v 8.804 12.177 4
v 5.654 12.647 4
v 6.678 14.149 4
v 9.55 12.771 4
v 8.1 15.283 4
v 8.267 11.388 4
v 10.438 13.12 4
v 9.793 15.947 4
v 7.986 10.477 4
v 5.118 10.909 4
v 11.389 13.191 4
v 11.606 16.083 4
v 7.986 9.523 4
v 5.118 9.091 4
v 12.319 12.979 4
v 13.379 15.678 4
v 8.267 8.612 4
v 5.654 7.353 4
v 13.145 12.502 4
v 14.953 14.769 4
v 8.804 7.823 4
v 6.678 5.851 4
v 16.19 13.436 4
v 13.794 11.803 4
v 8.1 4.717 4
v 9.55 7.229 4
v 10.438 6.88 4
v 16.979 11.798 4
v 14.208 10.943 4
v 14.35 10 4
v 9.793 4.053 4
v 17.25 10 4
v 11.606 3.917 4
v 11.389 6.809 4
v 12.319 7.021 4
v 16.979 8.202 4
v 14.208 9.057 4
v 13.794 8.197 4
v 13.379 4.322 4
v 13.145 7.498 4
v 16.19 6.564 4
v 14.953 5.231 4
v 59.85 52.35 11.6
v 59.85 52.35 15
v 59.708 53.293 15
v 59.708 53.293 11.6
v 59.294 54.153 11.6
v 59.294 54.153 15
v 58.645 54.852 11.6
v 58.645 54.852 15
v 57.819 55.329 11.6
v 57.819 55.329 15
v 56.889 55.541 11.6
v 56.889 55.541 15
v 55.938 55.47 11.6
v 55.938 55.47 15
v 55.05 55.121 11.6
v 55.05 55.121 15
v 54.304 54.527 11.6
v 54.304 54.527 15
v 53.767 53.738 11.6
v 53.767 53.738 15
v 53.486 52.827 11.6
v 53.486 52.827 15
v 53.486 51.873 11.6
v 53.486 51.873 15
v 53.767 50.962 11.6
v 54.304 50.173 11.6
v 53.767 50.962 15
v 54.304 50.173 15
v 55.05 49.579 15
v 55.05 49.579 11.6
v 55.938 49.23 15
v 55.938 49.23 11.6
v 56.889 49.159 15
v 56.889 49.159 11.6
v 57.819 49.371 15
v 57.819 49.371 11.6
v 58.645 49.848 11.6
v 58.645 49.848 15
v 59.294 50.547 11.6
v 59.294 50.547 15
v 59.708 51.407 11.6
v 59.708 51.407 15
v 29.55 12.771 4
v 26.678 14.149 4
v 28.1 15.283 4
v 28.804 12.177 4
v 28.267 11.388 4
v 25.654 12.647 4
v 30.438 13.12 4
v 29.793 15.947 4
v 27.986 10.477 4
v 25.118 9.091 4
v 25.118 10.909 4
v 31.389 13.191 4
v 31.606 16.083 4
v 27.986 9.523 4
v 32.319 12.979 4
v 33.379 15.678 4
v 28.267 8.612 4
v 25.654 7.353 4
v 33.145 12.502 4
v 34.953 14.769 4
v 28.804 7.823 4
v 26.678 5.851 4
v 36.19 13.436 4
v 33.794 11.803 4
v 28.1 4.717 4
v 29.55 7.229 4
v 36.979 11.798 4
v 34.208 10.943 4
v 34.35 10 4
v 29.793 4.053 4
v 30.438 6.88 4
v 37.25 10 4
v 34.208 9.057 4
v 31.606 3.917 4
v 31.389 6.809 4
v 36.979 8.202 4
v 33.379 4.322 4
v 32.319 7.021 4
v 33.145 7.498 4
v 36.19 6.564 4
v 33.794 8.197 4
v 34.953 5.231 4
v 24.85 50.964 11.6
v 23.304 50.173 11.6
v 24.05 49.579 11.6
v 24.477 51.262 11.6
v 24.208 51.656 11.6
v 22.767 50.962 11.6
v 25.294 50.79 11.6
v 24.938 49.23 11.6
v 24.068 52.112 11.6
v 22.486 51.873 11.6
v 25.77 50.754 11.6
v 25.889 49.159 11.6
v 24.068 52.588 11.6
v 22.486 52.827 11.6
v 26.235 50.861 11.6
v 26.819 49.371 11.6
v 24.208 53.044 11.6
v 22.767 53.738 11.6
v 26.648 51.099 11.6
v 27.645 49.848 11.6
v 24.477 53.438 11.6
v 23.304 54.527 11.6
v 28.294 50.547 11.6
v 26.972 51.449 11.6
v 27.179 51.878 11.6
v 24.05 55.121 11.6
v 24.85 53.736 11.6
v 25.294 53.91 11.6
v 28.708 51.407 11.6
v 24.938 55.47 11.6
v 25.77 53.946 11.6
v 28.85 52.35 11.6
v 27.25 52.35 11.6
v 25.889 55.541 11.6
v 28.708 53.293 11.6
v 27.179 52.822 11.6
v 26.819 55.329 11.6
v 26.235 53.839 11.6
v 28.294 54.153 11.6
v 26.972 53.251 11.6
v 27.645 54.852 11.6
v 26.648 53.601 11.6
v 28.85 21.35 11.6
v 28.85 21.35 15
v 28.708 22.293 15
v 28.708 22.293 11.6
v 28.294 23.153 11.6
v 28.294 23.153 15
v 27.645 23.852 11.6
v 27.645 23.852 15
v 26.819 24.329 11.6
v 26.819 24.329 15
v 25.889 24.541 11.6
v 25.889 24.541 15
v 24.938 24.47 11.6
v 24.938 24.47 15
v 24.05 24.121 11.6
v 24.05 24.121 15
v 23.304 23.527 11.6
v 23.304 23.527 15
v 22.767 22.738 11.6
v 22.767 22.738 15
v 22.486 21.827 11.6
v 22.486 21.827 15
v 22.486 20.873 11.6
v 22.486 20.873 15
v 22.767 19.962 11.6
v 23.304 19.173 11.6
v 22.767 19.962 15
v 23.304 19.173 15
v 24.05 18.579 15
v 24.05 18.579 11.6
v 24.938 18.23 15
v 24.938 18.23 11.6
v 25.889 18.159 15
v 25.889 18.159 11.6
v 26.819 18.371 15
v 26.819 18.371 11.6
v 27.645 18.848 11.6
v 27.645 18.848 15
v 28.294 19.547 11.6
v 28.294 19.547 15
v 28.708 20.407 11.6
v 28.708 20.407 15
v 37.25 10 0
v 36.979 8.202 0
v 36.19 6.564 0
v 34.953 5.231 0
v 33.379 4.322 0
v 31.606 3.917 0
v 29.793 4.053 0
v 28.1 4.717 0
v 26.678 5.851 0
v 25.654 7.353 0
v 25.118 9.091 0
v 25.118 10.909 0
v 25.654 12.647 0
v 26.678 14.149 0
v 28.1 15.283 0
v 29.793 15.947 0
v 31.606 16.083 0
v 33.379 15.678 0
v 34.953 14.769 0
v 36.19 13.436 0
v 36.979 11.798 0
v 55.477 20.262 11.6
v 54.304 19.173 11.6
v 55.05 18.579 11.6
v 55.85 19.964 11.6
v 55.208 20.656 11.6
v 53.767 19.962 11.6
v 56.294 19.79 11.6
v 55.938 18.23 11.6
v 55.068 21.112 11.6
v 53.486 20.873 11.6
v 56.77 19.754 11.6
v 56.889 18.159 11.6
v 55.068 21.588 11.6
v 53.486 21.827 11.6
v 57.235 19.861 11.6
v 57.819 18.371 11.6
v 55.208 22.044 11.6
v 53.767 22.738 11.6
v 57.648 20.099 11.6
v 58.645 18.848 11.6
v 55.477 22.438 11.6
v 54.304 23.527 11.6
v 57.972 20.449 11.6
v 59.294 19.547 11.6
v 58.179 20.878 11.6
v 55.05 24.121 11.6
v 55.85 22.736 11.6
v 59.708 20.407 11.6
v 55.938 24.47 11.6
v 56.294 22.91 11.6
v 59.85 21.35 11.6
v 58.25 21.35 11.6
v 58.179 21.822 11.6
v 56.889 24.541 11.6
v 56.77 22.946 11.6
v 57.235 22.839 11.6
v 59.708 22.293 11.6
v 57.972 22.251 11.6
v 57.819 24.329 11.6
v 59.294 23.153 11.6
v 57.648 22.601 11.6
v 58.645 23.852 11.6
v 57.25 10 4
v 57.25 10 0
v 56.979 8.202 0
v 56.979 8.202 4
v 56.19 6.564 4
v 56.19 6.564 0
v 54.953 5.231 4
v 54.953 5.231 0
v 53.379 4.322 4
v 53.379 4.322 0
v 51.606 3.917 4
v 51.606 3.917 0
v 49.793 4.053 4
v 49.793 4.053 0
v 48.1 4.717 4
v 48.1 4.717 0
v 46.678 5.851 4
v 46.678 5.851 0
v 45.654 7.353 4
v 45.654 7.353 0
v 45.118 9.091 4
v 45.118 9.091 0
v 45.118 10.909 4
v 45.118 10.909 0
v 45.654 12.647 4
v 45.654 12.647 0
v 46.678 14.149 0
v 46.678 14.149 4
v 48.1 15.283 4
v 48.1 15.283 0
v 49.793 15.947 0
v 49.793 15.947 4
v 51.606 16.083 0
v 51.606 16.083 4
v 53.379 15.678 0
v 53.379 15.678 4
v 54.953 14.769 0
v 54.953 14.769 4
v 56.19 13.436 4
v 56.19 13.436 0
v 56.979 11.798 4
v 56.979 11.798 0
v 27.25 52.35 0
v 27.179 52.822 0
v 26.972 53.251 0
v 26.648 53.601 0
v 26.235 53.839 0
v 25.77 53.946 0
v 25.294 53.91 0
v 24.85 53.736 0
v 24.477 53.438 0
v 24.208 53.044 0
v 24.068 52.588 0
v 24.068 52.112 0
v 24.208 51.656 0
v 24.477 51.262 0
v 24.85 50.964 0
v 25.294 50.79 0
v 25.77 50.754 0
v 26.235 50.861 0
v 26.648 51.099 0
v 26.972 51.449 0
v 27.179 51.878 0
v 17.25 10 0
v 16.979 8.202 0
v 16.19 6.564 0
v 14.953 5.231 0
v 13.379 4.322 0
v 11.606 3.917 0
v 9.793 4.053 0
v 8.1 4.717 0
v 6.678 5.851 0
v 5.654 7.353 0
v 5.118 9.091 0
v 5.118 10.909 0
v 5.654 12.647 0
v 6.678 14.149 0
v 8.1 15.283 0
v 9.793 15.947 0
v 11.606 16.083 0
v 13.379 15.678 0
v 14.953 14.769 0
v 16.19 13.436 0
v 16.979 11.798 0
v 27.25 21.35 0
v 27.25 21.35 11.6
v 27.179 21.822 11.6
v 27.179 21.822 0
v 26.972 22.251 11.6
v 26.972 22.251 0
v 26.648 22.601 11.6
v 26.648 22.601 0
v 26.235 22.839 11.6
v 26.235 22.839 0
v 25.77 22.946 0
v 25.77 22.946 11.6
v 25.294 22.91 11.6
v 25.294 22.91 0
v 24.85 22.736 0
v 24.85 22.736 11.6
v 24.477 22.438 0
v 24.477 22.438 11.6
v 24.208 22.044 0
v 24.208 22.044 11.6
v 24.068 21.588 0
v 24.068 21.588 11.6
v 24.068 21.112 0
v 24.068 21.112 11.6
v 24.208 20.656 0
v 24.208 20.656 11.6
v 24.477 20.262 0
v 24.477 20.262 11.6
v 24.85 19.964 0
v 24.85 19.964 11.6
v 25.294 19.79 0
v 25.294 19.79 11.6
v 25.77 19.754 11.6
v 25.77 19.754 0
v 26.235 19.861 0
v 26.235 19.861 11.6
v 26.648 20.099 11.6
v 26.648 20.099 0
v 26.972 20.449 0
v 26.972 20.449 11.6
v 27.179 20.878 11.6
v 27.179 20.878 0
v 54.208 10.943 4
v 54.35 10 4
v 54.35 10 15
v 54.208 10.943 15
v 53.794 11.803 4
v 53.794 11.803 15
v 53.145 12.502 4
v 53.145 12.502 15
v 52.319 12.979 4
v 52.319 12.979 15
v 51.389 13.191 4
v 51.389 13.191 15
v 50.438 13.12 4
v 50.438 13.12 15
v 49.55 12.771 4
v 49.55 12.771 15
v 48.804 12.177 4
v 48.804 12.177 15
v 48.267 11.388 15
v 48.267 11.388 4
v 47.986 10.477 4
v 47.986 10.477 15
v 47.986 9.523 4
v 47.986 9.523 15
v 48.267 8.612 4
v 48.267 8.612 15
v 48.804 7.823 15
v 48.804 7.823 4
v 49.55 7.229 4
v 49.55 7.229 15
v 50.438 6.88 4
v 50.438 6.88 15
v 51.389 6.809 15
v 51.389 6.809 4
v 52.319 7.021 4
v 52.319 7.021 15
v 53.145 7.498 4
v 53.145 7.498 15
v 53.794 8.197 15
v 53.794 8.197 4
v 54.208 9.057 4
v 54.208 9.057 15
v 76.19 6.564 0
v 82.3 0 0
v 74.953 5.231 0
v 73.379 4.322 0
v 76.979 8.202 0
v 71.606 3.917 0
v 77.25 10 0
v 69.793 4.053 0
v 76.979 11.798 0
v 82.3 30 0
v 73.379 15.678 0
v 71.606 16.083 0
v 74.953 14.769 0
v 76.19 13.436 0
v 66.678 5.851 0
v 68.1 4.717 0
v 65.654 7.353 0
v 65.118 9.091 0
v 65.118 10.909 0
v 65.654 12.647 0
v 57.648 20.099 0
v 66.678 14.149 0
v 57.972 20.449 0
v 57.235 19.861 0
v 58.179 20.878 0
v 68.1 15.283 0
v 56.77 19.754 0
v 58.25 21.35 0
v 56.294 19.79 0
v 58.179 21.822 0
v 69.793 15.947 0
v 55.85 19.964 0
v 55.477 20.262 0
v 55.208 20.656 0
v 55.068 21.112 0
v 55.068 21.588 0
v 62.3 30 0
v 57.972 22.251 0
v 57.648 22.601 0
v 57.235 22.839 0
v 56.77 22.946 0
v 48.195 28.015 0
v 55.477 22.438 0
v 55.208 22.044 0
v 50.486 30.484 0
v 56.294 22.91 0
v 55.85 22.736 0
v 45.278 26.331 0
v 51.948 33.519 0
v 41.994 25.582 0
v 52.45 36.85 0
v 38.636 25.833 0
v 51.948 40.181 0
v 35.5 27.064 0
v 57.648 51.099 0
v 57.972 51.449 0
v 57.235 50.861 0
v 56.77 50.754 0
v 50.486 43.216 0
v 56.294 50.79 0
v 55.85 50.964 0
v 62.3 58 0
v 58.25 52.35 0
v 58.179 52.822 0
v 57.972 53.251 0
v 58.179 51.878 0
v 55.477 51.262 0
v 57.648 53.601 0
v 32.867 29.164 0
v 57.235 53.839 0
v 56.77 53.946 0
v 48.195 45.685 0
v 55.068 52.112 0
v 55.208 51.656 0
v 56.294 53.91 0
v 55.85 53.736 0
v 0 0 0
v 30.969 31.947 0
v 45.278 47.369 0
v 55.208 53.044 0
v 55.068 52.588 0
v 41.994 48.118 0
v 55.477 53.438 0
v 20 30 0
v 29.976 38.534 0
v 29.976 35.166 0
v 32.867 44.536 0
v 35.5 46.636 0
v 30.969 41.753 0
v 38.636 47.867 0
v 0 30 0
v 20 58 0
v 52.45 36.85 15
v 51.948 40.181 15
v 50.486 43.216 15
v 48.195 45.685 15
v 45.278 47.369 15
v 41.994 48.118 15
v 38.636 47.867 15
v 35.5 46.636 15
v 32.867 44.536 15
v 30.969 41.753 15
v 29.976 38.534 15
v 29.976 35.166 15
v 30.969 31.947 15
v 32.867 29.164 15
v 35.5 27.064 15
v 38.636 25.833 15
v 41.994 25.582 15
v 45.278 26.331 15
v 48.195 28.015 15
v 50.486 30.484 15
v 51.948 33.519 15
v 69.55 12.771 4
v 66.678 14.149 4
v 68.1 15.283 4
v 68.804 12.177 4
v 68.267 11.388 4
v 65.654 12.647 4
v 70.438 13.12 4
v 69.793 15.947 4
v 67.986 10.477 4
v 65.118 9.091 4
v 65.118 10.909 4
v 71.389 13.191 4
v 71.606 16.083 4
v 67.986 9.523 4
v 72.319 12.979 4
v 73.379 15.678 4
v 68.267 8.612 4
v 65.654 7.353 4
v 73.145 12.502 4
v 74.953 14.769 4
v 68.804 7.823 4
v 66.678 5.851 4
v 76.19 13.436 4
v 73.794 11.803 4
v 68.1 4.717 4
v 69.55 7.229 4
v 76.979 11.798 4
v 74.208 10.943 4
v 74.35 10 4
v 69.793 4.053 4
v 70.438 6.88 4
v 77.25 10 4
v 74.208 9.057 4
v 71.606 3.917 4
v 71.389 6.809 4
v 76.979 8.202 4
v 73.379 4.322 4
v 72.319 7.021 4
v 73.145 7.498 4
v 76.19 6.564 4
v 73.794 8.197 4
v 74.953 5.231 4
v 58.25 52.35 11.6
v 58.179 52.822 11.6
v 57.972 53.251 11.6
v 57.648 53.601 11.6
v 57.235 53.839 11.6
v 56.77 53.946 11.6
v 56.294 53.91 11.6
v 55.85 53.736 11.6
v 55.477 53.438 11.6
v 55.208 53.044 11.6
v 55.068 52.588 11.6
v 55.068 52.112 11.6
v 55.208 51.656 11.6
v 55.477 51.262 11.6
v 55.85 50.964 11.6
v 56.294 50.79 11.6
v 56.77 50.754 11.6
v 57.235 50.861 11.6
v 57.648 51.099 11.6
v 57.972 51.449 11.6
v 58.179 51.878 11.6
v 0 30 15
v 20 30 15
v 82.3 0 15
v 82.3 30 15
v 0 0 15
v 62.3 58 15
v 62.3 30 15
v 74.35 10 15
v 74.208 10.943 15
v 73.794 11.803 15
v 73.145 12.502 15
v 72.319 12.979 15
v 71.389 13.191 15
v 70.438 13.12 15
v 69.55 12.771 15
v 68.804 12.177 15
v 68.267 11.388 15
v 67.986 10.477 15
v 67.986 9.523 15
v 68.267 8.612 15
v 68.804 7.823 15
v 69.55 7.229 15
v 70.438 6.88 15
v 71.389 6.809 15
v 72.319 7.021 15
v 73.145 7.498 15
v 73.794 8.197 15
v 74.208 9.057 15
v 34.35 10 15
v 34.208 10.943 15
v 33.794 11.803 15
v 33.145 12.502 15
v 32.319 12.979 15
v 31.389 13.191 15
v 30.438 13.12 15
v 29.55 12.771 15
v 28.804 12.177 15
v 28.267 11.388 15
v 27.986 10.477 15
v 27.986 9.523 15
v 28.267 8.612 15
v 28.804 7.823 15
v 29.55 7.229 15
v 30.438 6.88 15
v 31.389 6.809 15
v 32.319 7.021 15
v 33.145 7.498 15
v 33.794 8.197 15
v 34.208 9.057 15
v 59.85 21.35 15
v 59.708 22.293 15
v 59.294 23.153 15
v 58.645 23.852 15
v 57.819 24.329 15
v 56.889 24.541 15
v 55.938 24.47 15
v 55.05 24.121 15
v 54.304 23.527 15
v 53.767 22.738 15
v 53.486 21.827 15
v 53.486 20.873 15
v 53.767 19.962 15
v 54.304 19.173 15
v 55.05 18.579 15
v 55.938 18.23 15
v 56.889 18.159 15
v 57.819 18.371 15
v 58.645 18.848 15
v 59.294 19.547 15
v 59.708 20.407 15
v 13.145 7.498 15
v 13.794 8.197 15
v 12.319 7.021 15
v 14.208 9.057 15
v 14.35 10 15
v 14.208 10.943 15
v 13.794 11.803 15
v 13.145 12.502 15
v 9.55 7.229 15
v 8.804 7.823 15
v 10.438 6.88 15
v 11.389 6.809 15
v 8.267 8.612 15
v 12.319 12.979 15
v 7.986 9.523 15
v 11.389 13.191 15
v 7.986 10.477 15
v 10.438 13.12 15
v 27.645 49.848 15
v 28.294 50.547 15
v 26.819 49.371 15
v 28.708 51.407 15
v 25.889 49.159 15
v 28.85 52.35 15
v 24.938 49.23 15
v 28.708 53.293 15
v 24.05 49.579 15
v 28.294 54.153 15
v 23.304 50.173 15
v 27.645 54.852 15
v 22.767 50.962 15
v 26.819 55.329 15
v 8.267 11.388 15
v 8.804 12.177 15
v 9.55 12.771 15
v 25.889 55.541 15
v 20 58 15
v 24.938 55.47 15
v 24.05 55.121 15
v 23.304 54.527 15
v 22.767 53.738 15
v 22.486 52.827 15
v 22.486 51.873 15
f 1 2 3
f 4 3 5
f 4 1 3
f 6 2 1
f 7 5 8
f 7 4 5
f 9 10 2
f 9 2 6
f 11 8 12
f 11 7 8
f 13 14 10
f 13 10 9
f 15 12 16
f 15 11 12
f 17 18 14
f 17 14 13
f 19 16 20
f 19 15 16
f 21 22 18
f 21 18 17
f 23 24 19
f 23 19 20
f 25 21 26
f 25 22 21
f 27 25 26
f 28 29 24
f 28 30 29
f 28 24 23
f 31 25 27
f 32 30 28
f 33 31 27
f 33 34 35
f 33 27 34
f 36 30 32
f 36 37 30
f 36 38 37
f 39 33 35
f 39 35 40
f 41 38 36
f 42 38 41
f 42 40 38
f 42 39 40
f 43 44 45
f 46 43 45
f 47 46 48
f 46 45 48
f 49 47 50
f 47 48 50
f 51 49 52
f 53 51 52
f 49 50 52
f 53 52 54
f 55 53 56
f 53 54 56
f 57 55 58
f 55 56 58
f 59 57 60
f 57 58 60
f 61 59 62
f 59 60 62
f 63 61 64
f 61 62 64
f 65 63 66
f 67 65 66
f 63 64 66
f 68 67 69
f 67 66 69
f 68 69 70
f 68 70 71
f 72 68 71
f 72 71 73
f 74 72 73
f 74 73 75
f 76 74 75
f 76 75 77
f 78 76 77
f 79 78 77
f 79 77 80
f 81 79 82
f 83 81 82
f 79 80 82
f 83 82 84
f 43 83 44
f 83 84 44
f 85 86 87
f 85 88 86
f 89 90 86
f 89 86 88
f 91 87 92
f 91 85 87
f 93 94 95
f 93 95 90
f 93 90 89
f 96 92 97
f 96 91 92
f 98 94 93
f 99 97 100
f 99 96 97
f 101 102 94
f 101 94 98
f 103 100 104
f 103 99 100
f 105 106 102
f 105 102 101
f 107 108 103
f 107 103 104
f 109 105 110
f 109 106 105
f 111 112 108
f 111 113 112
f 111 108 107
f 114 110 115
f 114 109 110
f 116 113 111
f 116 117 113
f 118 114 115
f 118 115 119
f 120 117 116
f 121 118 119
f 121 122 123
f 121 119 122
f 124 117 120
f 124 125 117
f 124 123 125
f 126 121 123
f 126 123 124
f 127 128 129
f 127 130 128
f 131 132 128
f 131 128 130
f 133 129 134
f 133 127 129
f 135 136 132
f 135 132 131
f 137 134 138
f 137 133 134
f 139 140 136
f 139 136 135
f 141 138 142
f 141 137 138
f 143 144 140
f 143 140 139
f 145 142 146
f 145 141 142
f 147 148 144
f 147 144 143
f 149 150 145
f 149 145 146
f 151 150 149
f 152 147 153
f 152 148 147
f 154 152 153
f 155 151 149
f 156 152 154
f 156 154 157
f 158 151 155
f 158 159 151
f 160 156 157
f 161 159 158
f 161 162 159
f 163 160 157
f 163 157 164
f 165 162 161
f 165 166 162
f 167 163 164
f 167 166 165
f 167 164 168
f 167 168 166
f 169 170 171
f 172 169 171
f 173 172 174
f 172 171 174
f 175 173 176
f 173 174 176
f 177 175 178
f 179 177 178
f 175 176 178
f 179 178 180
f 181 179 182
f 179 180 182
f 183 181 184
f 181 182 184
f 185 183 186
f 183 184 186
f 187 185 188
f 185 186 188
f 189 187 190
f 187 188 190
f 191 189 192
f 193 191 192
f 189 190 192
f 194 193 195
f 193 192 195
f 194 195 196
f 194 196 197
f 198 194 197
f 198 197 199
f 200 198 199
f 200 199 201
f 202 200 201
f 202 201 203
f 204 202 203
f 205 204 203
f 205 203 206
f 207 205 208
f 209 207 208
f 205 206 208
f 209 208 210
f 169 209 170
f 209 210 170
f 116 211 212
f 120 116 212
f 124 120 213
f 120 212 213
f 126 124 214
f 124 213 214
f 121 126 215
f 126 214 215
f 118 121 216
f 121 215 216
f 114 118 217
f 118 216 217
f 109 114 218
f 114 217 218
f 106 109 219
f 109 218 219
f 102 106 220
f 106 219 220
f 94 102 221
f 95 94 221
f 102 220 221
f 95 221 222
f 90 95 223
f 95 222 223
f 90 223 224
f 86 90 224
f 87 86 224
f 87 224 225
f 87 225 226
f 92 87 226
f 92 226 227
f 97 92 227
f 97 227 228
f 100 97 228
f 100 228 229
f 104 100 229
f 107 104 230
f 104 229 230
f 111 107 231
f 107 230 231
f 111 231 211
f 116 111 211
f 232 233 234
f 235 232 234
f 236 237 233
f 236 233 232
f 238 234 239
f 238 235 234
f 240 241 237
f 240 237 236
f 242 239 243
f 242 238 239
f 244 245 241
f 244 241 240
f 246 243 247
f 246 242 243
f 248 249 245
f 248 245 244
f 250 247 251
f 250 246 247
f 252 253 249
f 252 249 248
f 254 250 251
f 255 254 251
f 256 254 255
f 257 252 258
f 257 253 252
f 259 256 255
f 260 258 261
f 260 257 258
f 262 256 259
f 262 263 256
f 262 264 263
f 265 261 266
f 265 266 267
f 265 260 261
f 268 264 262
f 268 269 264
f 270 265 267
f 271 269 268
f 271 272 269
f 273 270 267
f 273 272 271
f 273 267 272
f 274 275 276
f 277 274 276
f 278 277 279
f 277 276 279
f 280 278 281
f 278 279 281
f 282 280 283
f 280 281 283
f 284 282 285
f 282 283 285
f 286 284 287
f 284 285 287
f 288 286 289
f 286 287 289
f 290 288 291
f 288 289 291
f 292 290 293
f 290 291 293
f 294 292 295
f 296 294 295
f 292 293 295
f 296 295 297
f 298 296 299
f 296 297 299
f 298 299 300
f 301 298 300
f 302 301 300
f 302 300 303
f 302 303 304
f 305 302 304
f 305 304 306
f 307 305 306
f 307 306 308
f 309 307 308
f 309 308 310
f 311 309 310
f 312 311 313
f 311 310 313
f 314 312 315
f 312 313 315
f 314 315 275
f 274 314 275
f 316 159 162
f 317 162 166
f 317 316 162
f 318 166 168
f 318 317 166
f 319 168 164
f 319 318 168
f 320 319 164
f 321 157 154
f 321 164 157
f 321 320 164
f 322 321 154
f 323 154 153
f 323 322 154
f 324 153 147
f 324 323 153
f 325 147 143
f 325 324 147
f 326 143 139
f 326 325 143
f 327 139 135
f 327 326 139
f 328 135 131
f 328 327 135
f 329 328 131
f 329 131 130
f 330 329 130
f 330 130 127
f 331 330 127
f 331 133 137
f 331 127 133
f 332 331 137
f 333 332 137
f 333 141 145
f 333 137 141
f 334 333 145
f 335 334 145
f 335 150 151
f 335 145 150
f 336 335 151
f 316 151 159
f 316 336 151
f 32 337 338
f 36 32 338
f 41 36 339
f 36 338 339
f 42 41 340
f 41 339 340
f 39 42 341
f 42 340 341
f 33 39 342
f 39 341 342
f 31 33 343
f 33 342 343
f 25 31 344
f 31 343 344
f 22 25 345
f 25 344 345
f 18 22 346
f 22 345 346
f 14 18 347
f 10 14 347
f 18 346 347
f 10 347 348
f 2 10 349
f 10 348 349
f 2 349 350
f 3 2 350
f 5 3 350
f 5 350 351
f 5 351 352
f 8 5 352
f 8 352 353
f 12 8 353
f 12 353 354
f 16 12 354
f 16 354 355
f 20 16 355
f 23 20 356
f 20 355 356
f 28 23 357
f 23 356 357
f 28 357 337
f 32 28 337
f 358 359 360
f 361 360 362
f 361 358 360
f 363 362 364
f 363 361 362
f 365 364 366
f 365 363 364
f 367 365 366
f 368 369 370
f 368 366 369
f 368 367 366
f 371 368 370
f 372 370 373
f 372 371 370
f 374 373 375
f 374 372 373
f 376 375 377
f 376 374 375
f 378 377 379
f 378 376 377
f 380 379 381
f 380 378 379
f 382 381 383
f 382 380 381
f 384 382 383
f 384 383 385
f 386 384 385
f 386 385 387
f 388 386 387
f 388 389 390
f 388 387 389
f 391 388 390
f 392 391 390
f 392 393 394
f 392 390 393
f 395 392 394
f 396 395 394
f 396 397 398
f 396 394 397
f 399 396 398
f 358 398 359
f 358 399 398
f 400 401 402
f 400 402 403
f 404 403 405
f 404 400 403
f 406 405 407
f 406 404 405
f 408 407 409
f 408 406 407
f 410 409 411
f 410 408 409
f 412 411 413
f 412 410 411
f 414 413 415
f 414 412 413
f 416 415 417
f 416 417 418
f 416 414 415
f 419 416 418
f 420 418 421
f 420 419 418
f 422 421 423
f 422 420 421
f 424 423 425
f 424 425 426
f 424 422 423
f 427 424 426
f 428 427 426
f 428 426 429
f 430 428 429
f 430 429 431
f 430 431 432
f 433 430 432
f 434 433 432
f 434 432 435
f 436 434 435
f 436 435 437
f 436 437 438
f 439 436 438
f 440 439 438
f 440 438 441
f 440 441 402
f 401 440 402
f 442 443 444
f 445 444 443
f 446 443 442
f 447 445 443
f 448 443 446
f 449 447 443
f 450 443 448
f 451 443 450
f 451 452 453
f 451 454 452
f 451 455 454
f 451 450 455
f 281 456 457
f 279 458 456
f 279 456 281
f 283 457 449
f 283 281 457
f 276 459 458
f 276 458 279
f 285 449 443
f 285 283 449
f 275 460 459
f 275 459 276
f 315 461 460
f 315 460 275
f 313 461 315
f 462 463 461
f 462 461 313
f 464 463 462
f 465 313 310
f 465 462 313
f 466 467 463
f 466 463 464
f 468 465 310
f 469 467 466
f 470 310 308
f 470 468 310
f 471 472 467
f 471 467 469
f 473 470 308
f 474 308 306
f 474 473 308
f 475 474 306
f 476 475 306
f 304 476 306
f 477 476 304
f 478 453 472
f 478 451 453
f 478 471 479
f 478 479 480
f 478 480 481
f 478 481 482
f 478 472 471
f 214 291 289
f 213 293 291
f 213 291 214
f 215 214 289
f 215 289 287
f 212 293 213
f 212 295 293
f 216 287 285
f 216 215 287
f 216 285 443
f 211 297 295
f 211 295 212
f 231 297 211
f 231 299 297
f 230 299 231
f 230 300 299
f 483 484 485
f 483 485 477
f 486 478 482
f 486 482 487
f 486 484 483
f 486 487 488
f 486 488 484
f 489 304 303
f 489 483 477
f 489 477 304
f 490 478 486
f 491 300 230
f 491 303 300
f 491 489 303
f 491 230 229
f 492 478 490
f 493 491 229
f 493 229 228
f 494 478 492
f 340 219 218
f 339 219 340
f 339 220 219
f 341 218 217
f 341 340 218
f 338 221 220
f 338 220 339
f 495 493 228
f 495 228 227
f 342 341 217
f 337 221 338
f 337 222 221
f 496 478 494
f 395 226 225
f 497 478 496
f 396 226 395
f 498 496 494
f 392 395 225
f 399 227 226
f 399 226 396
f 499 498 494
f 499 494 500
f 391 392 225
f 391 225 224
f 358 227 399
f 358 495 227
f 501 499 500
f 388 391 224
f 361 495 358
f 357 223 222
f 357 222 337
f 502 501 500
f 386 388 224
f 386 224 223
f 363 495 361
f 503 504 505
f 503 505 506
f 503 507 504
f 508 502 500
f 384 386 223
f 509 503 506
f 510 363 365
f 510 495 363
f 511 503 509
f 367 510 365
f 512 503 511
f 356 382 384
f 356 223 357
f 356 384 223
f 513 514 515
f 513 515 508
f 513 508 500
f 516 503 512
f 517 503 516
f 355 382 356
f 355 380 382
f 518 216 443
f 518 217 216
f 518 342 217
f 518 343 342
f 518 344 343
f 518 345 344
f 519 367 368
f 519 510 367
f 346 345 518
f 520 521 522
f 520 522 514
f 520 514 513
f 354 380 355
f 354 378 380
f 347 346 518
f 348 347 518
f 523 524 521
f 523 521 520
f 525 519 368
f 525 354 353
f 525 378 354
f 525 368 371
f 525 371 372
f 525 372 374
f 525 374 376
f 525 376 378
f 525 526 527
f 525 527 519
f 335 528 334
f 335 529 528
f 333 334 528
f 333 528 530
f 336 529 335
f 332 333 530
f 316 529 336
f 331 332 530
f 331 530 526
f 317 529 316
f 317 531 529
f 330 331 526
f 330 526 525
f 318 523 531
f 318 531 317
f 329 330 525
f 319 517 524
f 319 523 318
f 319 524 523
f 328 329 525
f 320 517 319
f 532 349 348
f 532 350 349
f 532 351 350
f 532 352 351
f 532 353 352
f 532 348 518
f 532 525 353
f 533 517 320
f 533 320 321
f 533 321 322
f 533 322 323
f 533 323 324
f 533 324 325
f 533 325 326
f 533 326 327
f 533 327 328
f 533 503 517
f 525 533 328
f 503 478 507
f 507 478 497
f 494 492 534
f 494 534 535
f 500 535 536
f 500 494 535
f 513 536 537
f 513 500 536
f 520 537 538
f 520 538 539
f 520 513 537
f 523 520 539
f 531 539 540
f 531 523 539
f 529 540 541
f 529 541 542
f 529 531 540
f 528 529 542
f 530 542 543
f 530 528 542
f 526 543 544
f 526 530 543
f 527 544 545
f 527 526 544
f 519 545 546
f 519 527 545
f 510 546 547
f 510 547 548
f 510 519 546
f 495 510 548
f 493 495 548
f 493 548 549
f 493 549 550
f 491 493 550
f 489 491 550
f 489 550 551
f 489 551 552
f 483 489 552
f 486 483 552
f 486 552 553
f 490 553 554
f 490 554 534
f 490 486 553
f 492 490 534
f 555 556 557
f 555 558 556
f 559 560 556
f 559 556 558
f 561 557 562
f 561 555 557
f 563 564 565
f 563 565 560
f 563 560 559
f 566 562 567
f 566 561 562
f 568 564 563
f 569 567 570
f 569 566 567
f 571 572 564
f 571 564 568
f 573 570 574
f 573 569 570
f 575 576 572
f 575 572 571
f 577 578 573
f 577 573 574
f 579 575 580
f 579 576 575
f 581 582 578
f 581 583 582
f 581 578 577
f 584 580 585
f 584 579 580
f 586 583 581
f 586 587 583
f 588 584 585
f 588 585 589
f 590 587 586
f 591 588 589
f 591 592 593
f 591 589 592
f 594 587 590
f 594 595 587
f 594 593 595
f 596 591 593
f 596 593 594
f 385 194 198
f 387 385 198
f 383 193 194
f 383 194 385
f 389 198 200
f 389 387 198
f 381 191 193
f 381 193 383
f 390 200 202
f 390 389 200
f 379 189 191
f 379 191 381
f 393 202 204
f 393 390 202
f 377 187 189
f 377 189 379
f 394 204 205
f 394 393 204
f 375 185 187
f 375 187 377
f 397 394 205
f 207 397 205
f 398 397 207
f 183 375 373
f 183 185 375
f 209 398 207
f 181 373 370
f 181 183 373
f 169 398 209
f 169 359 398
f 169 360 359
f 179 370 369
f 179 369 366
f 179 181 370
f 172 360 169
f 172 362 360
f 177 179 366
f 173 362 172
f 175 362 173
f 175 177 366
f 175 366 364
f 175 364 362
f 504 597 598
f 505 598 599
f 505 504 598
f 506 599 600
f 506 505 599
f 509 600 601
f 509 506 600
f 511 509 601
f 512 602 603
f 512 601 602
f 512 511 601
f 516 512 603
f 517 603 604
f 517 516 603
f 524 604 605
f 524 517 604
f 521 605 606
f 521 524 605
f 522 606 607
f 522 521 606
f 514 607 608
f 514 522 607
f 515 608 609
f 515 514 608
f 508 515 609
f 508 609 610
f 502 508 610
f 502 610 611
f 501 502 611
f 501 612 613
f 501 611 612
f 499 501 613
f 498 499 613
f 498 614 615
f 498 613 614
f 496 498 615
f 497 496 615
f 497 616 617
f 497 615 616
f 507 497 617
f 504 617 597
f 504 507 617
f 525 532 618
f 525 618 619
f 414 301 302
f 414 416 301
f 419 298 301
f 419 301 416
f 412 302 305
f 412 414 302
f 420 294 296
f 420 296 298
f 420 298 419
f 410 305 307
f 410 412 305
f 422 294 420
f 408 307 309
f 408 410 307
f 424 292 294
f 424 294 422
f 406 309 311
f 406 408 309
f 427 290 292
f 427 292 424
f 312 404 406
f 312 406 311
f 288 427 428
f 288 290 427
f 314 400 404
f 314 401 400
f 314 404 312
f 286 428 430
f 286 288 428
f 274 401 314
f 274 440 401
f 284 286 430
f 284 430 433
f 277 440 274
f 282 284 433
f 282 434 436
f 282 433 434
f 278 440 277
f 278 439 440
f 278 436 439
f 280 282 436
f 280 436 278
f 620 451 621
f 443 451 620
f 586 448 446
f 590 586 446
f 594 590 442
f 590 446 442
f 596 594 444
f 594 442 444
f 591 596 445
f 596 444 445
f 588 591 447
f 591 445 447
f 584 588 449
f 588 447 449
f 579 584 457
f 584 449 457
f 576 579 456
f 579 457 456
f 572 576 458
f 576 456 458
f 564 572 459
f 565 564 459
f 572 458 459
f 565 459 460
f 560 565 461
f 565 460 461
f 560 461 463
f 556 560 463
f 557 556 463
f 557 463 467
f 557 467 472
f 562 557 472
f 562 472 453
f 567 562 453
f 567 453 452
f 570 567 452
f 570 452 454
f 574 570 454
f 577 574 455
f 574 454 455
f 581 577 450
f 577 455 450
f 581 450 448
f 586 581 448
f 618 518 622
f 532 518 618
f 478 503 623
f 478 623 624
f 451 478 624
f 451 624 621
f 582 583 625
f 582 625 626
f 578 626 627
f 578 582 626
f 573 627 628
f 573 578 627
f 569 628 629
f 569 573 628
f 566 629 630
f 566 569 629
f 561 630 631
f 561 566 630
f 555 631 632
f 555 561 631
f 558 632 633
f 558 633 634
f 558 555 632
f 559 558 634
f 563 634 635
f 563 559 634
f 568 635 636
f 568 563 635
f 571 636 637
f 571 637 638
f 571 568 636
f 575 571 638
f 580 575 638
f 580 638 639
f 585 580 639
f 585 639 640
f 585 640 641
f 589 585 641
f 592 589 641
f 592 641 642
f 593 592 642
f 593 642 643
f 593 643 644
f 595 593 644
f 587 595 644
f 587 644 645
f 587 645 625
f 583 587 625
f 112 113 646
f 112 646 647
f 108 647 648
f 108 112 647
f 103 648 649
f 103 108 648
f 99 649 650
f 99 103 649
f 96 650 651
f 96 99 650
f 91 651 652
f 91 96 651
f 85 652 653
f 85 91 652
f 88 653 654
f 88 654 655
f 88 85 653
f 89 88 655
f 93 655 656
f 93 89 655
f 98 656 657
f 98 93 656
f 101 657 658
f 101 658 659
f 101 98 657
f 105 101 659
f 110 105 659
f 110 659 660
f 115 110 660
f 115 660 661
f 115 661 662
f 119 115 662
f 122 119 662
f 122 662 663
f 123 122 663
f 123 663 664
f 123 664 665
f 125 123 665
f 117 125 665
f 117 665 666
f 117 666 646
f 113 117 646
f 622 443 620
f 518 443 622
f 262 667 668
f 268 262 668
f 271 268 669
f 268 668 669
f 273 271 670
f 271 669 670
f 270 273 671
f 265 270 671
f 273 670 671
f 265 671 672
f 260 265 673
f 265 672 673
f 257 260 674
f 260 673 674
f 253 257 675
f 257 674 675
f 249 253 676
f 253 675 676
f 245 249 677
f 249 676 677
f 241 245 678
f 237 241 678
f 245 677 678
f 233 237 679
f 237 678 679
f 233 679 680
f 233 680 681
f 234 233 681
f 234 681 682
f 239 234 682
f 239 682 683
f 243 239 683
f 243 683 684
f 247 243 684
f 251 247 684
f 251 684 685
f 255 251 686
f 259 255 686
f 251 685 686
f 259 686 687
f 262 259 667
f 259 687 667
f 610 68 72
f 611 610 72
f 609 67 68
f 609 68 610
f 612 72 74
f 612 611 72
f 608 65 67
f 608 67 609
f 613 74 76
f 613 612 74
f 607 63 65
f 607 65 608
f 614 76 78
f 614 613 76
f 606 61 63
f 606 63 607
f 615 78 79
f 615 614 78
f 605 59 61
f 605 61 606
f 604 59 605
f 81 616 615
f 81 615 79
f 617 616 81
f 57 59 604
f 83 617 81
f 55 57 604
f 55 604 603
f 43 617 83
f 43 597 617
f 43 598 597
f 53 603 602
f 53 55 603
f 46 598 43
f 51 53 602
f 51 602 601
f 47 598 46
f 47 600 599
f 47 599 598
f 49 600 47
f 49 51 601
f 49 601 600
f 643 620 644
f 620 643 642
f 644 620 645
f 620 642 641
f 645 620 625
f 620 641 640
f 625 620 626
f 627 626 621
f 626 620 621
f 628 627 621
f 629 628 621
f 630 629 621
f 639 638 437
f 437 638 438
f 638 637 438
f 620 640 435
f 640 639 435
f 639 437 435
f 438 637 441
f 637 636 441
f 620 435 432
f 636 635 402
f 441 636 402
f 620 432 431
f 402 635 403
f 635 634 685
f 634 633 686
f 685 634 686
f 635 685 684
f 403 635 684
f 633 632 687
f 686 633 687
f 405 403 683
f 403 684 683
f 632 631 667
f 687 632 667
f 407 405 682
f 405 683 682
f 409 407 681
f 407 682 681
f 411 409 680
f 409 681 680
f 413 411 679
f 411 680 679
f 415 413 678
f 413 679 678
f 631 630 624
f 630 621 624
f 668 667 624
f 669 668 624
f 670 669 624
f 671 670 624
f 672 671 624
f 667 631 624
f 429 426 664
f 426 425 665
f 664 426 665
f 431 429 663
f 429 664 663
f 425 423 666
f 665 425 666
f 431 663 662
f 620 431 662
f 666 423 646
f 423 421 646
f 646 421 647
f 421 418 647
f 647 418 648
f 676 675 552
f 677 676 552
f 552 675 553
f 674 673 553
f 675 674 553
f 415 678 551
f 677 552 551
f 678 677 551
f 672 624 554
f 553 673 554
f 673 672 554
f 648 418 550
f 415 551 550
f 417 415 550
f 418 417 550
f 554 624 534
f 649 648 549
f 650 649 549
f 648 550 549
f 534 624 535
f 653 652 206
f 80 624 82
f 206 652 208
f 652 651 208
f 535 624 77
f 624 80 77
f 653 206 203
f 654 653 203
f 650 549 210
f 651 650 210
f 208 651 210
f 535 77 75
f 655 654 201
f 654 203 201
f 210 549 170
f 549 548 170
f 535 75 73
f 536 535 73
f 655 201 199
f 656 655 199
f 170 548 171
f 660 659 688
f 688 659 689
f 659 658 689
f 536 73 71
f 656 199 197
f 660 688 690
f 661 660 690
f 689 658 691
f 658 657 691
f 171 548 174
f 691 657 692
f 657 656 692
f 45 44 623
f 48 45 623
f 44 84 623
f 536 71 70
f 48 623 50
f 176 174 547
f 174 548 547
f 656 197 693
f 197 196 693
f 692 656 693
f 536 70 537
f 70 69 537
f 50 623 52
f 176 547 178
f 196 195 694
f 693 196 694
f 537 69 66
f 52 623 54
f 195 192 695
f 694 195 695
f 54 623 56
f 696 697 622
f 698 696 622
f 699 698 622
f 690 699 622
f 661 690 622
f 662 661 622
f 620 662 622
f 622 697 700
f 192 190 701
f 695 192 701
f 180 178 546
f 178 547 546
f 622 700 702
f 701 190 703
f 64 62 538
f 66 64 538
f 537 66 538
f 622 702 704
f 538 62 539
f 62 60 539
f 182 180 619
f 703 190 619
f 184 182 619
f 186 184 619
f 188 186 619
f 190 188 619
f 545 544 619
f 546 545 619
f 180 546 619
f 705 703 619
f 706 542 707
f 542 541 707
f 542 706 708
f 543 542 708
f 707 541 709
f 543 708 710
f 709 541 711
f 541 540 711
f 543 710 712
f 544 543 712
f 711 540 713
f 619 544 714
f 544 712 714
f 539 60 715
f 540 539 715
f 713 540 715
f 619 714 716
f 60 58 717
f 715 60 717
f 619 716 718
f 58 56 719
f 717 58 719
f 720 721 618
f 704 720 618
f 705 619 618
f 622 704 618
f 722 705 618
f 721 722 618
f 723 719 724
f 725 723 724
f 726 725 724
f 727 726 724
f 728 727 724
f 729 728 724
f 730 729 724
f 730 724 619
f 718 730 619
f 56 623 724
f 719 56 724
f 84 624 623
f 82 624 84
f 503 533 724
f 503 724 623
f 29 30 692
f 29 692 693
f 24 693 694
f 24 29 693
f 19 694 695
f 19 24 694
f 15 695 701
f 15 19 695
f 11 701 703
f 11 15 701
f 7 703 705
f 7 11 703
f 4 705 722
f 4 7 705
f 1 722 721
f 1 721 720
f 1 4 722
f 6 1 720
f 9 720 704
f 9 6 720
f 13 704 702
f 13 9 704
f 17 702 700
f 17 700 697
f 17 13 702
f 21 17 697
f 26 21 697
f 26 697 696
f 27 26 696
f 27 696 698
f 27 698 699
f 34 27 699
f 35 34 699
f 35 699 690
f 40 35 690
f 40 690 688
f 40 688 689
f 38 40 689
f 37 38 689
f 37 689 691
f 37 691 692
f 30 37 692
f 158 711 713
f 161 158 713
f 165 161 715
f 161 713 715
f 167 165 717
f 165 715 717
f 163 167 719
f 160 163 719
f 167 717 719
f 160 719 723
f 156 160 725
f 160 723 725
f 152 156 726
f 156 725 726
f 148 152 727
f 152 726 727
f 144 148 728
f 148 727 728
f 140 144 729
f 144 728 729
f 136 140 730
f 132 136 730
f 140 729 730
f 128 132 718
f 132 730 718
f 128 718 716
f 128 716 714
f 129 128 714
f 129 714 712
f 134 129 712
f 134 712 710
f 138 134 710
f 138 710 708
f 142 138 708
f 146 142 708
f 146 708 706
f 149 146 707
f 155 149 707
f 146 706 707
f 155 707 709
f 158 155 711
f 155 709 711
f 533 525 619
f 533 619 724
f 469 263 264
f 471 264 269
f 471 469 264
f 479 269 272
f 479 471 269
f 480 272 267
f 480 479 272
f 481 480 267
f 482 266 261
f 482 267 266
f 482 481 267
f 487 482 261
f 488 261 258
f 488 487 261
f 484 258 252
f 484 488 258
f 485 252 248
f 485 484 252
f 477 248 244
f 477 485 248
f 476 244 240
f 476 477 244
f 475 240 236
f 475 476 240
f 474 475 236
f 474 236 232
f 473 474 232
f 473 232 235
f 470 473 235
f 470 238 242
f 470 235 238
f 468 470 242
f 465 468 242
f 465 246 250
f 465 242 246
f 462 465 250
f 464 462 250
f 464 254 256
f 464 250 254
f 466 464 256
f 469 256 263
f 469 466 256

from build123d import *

# Parameters (mm, degrees)
SKETCH_R        = 11.3
SKETCH_R_2      = 1.6
SKETCH_R_3      = 3.2
PAD_DEPTH       = 15
SKETCH001_R     = 3.2
POCKET_DEPTH    = 3.4
SKETCH002_R     = 6.1
POCKET001_DEPTH = 4


with BuildPart() as part:
    # Sketch → Pad (new body)
    with BuildSketch(Plane.XY):
        Polygon((20, 30), (20, 58), (62.3, 58), (62.3, 30), (82.3, 30), (82.3, 0), (0, 0), (0, 30), align=None)
        with Locations((41.15, 36.85)):
            Circle(SKETCH_R, mode=Mode.SUBTRACT)
        with Locations((25.65, 52.35)):
            Circle(SKETCH_R_2, mode=Mode.SUBTRACT)
        with Locations((25.65, 21.35)):
            Circle(SKETCH_R_2, mode=Mode.SUBTRACT)
        with Locations((56.65, 52.35)):
            Circle(SKETCH_R_2, mode=Mode.SUBTRACT)
        with Locations((56.65, 21.35)):
            Circle(SKETCH_R_2, mode=Mode.SUBTRACT)
        with Locations((11.15, 10)):
            Circle(SKETCH_R_3, mode=Mode.SUBTRACT)
        with Locations((31.15, 10)):
            Circle(SKETCH_R_3, mode=Mode.SUBTRACT)
        with Locations((51.15, 10)):
            Circle(SKETCH_R_3, mode=Mode.SUBTRACT)
        with Locations((71.15, 10)):
            Circle(SKETCH_R_3, mode=Mode.SUBTRACT)
    extrude(amount=PAD_DEPTH)

    # Sketch001 (on Face19 of Pad) → Pocket (cut)
    with BuildSketch(Plane.XY.offset(15)):
        with Locations((25.65, 52.35)):
            Circle(SKETCH001_R)
        with Locations((56.65, 52.35)):
            Circle(SKETCH001_R)
        with Locations((56.65, 21.35)):
            Circle(SKETCH001_R)
        with Locations((25.65, 21.35)):
            Circle(SKETCH001_R)
    extrude(amount=-POCKET_DEPTH, mode=Mode.SUBTRACT)

    # Sketch002 (on Face4 of Pocket) → Pocket001 (cut)
    with BuildSketch(Plane(origin=(0, 0, 0), x_dir=(1, 0, 0), z_dir=(0, 0, -1))):
        with Locations((11.15, -10)):
            Circle(SKETCH002_R)
        with Locations((31.15, -10)):
            Circle(SKETCH002_R)
        with Locations((51.15, -10)):
            Circle(SKETCH002_R)
        with Locations((71.15, -10)):
            Circle(SKETCH002_R)
    extrude(amount=-POCKET001_DEPTH, mode=Mode.SUBTRACT)


solid = part.part
